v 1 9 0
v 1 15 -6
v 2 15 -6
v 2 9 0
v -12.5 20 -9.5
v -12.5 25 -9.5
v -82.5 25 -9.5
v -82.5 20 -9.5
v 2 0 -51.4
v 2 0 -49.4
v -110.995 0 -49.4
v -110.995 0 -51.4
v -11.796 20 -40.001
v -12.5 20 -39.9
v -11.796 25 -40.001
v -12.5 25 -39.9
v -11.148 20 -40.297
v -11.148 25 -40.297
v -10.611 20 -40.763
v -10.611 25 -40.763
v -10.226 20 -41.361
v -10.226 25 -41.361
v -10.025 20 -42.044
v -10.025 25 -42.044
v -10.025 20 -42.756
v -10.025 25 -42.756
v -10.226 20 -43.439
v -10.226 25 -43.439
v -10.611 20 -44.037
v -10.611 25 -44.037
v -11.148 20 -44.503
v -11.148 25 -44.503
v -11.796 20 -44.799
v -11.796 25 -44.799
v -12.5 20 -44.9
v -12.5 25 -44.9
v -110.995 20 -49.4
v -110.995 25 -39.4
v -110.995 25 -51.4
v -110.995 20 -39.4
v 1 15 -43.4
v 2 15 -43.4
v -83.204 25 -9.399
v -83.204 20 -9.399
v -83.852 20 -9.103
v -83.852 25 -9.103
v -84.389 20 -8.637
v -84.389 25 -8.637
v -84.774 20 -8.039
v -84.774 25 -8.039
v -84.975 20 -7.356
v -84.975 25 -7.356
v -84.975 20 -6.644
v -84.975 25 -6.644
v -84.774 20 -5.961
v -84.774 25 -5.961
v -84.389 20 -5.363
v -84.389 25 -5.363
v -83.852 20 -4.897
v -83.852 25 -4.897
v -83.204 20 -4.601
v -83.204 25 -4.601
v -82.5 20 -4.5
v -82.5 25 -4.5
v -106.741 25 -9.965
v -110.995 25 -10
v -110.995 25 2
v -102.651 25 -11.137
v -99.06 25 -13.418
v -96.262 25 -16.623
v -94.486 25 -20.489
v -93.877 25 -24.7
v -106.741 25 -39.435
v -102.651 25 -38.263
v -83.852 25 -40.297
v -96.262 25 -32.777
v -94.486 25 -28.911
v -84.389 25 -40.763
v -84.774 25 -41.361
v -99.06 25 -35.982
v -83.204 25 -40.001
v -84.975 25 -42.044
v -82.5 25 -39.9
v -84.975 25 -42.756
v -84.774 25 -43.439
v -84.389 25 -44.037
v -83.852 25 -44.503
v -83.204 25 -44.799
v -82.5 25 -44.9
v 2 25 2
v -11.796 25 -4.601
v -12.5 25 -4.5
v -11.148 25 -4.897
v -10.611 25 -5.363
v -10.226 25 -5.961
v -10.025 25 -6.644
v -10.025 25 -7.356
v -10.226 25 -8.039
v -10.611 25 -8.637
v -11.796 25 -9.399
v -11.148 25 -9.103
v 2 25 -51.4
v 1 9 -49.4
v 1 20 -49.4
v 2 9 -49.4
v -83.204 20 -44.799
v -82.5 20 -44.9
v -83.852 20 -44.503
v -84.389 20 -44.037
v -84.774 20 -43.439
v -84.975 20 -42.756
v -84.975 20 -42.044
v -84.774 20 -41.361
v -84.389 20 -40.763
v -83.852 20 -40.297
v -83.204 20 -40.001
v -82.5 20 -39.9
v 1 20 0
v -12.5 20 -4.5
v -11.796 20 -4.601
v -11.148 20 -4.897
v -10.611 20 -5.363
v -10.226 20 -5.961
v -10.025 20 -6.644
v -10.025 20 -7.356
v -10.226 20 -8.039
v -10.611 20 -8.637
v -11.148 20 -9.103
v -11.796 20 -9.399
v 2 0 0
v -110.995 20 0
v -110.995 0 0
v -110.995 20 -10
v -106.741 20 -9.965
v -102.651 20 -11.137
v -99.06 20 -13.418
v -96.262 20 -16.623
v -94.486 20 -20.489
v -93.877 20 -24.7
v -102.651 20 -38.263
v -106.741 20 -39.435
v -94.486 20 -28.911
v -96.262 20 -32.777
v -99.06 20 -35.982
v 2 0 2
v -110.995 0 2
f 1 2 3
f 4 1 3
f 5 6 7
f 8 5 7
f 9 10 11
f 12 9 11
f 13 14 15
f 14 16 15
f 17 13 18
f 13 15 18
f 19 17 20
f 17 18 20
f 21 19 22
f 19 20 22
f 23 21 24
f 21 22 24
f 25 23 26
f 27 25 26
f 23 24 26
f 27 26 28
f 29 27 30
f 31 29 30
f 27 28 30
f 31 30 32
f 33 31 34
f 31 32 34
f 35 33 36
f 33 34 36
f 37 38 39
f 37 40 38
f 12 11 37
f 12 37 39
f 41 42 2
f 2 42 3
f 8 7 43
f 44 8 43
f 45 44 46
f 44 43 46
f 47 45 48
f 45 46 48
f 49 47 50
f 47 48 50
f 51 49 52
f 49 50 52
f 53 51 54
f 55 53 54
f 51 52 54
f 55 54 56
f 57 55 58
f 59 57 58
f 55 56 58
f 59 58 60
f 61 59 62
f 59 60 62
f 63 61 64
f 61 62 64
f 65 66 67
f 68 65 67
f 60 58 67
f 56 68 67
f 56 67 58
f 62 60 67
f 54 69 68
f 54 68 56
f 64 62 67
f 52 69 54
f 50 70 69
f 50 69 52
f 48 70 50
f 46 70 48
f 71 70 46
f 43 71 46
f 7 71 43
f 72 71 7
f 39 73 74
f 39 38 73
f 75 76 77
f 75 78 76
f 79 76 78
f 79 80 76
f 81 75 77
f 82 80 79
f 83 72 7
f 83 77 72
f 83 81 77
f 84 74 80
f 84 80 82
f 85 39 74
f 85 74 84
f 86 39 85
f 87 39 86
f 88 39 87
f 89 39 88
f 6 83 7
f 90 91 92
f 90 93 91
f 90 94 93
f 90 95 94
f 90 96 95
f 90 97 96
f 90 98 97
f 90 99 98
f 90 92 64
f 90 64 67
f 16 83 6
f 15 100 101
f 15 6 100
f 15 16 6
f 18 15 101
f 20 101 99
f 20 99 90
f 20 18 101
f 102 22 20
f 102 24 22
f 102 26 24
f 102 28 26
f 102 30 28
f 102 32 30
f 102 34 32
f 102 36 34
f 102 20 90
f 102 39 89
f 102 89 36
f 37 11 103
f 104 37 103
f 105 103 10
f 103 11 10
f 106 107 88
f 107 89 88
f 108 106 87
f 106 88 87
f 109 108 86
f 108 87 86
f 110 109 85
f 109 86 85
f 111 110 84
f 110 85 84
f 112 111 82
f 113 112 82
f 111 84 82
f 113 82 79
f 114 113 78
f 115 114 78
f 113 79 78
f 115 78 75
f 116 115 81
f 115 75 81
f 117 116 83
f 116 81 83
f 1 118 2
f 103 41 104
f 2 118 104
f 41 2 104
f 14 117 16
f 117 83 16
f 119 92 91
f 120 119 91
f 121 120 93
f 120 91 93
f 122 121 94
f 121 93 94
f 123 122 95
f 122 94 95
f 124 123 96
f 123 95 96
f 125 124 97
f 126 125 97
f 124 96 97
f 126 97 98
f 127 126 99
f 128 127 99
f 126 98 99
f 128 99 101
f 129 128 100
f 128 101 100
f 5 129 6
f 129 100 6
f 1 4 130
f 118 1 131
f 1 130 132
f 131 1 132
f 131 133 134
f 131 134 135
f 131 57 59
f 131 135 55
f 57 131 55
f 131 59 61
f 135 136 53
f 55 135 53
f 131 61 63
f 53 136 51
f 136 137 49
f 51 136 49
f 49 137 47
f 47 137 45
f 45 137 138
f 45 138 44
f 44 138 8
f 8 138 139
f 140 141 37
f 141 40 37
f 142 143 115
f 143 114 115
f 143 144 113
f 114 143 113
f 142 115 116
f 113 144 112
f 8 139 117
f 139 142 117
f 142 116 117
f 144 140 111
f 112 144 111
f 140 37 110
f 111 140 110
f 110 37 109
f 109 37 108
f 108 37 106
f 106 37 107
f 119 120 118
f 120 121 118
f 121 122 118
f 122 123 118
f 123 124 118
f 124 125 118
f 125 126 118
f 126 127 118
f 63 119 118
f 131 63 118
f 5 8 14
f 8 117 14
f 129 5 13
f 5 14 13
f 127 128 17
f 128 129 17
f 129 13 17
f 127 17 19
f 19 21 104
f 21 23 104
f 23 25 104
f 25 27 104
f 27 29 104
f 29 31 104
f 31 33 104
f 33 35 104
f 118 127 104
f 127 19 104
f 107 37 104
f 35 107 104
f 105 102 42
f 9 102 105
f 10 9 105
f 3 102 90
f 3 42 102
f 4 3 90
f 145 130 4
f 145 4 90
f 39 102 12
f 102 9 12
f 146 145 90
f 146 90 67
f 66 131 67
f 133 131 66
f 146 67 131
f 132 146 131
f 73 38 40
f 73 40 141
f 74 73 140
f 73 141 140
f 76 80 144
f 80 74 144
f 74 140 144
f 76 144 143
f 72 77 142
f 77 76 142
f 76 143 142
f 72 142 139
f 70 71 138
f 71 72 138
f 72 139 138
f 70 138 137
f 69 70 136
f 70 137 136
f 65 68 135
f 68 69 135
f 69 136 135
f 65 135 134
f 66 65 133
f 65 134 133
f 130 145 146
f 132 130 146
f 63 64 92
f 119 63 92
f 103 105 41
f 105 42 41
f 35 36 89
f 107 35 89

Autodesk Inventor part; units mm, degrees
ref_plane "YZ Plane" through (0, 0, 0) normal (1, 0, 0) x (0, 1, 0)
ref_plane "XZ Plane" through (0, 0, 0) normal (0, 1, 0) x (-1, 0, 0)
ref_plane "XY Plane" through (0, 0, 0) normal (0, 0, 1) x (1, 0, 0)
sketch "Szkic1" plane through (0, 0, 0) normal (0, 1, 0) x (-1, 0, 0)
  line L0 (0, 0) -> (0, -49.4)
  line L1 (0, 0) -> (108, 0)
  line L2 (0, 0) -> (108.995, 0)
  line L3 (108.995, 0) -> (108.995, -49.4)
  line L4 (108.995, -49.4) -> (0, -49.4)
  line L5 (0, -49.4) -> (0, 0)
  line L6 (0, 0) -> (0, 2)
  line L7 (0, 2) -> (-2, 2)
  line L8 (108.995, -49.4) -> (110.995, -49.4)
  line L9 (110.995, -49.4) -> (110.995, -51.4)
  line L10 (110.995, -51.4) -> (-2, -51.4)
  line L11 (-2, -51.4) -> (-2, 2)
  line L12 (-2, 2) -> (110.995, 2)
  line L13 (110.995, 2) -> (110.995, -51.4)
  line L14 (110.995, 2) -> (100.995, 2)
  line L15 (100.995, 2) -> (100.995, 0)
  line L16 (110.995, -51.4) -> (100.995, -51.4)
  line L17 (100.995, -51.4) -> (100.995, -49.4)
  line L18 (-2, 2) -> (8, 2)
  line L19 (8, 2) -> (8, 0)
  line L20 (-2, -51.4) -> (8, -51.4)
  line L21 (8, -51.4) -> (8, -49.4)
  line L22 (-2, 0) -> (0, 0)
  line L23 (108.995, 0) -> (110.995, 0)
  line L24 (108.995, -49.4) -> (110.995, -49.4)
  line L25 (-2, -49.4) -> (0, -49.4)
  line L26 (100.995, 2) -> (90.995, 2)
  line L27 (90.995, 2) -> (90.995, 0)
  line L28 (100.995, -51.4) -> (90.995, -51.4)
  line L29 (90.995, -51.4) -> (90.995, -49.4)
  line L30 (110.995, -24.7) -> (-2, -24.7)
  line L31 (54.4975, -51.4) -> (54.4975, 2)
  line L32 (90.995, 2) -> (60.995, 2)
  line L33 (60.995, 2) -> (60.995, 0)
  line L34 (48, 2) -> (48, 0)
  line L35 (60.995, -51.4) -> (60.995, -49.4)
  line L36 (48, -51.4) -> (48, -49.4)
  point P0 (48, 0)
  dimension "d0" = 49.4
  dimension "d1" = 108
  dimension "d2" = 2
  dimension "d3" = 2
  dimension "d4" = 2
  dimension "d5" = 2
  dimension "d6" = 10
  dimension "d7" = 10
  dimension "d8" = 10
  dimension "d9" = 10
  dimension "d16" = 10
  dimension "d17" = 10
  dimension "d33" = 30
extrude "Wyciągnięcie proste1" add sketch "Szkic1" along normal blind 20 contours L6 L12 L19 L1 | L22 L11 L7 L6 | L19 L12 L34 L1 | L4 L21 L10 L11 L25 | L34 L12 L31 L1 | L4 L36 L10 L21 | L31 L10 L36 L4 | L4 L35 L10 L31 | L31 L12 L33 L1 | L2 L1 L15 L12 L13 L23 | L8 L9 L10 L17 L4 | L4 L29 L10 L35 | L33 L12 L27 L1 | L17 L10 L29 L4 | L27 L12 L15 L1
sketch "Szkic2" plane through (0, 20, 0) normal (0, 1, 0) x (1, 0, 0)
  line L0 (-8, -2) -> (2, -2) projected
  line L1 (2, 51.4) -> (-110.995, 51.4) projected
  line L2 (2, -2) -> (-110.995, -2)
  line L3 (-110.995, -2) -> (-110.995, 51.4)
  line L4 (-110.995, 51.4) -> (2, 51.4)
  line L5 (2, 51.4) -> (2, -2)
  line L6 (-110.995, 0) -> (-110.995, 10)
  line L7 (-110.995, 49.4) -> (2, 49.4) projected
  line L8 (-110.995, 49.4) -> (-110.995, 39.4)
  arc A0 (-110.995, 10) -> (-110.995, 39.4) centre (-125.3914, 24.7) ccw
  arc A1 (-110.995, 10) -> (-110.995, 39.4) centre (-108.7482, 24.7) ccw
  point P0 (0, 0)
  point P1 (-100.995, 51.4)
  point P2 (-100.995, 49.4)
  point P3 (-100.995, 51.4)
  point P4 (-90.995, 51.4)
  point P5 (-90.995, 49.4)
  point P6 (-60.995, 51.4)
  point P7 (-60.995, 49.4)
  dimension "d12" = 10
  dimension "d13" = 10
extrude "Wyciągnięcie proste2" add sketch "Szkic2" along normal blind 5 contours L2 L3 A1 L7 L5 L0 | L7 L3 L1 L5
sketch "Szkic3" plane through (2, 0, -49.4) normal (1, 0, 0) x (0, 0, -1)
  line L0 (-39.4, 25) -> (-51.4, 25) projected
  line L1 (2, 0) -> (2, 20) projected
  line L2 (-51.4, 25) -> (2, 25)
  line L3 (2, 25) -> (2, 15)
  line L4 (2, 15) -> (-51.4, 15)
  line L5 (-51.4, 15) -> (-51.4, 25)
  point P0 (-49.4, 0)
  dimension "d18" = 10
extrude "Wyciągnięcie proste3" add sketch "Szkic3" against normal blind 1
chamfer "Faza1" distance 6 angle 45 2 edges at (1.5, 15, 0) (1.5, 15, -49.4)
sketch "Szkic5" plane through (0, 25, 0) normal (0, 1, 0) x (1, 0, 0)
  line L0 (-110.995, -2) -> (2, -2) projected
  line L1 (2, -2) -> (2, 7)
  line L2 (2, -2) -> (11, -2) construction
  line L3 (2, 7) -> (-12.5, 7)
  line L4 (-54.4975, -2) -> (-54.4975, 51.4)
  line L5 (2, 51.4) -> (-110.995, 51.4) projected
  line L6 (2, -2) -> (2, 51.4) projected
  line L7 (2, 24.7) -> (-94.0806, 24.7)
  line L8 (-110.995, 7) -> (-96.495, 7)
  line L9 (2, 42.4) -> (-12.5, 42.4)
  line L10 (-110.995, 42.4) -> (-96.495, 42.4)
  line L11 (-12.5, 7) -> (-82.5, 7) construction
  line L12 (-12.5, 9.5) -> (-82.5, 9.5)
  line L13 (-82.5, 4.5) -> (-12.5, 4.5)
  arc A0 (-12.5, 4.5) -> (-12.5, 9.5) centre (-12.5, 7) ccw
  arc A1 (-82.5, 9.5) -> (-82.5, 4.5) centre (-82.5, 7) ccw
  line L14 (-12.5, 42.4) -> (-82.5, 42.4) construction
  line L15 (-12.5, 44.9) -> (-82.5, 44.9)
  line L16 (-82.5, 39.9) -> (-12.5, 39.9)
  arc A2 (-12.5, 39.9) -> (-12.5, 44.9) centre (-12.5, 42.4) ccw
  arc A3 (-82.5, 44.9) -> (-82.5, 39.9) centre (-82.5, 42.4) ccw
  line L17 (-12.5, 42.4) -> (57.5, 42.4) construction
  point P0 (0, 0)
  point P1 (-47.5, 7)
  point P2 (-47.5, 42.4)
  dimension "d37" = 9
  dimension "d38" = 90
  dimension "d39" = 14.5
  dimension "d40" = 70
  dimension "d41" = 5
  dimension "d42" = 70
  dimension "d43" = 180
  dimension "d44" = 5
extrude "Wyciągnięcie proste5" cut sketch "Szkic5" against normal blind 20 contours L13 A1 L12 L4 | L4 L12 A0 L13 | L16 A3 L15 L4 | L4 L15 A2 L16
properties part number "klapa"
